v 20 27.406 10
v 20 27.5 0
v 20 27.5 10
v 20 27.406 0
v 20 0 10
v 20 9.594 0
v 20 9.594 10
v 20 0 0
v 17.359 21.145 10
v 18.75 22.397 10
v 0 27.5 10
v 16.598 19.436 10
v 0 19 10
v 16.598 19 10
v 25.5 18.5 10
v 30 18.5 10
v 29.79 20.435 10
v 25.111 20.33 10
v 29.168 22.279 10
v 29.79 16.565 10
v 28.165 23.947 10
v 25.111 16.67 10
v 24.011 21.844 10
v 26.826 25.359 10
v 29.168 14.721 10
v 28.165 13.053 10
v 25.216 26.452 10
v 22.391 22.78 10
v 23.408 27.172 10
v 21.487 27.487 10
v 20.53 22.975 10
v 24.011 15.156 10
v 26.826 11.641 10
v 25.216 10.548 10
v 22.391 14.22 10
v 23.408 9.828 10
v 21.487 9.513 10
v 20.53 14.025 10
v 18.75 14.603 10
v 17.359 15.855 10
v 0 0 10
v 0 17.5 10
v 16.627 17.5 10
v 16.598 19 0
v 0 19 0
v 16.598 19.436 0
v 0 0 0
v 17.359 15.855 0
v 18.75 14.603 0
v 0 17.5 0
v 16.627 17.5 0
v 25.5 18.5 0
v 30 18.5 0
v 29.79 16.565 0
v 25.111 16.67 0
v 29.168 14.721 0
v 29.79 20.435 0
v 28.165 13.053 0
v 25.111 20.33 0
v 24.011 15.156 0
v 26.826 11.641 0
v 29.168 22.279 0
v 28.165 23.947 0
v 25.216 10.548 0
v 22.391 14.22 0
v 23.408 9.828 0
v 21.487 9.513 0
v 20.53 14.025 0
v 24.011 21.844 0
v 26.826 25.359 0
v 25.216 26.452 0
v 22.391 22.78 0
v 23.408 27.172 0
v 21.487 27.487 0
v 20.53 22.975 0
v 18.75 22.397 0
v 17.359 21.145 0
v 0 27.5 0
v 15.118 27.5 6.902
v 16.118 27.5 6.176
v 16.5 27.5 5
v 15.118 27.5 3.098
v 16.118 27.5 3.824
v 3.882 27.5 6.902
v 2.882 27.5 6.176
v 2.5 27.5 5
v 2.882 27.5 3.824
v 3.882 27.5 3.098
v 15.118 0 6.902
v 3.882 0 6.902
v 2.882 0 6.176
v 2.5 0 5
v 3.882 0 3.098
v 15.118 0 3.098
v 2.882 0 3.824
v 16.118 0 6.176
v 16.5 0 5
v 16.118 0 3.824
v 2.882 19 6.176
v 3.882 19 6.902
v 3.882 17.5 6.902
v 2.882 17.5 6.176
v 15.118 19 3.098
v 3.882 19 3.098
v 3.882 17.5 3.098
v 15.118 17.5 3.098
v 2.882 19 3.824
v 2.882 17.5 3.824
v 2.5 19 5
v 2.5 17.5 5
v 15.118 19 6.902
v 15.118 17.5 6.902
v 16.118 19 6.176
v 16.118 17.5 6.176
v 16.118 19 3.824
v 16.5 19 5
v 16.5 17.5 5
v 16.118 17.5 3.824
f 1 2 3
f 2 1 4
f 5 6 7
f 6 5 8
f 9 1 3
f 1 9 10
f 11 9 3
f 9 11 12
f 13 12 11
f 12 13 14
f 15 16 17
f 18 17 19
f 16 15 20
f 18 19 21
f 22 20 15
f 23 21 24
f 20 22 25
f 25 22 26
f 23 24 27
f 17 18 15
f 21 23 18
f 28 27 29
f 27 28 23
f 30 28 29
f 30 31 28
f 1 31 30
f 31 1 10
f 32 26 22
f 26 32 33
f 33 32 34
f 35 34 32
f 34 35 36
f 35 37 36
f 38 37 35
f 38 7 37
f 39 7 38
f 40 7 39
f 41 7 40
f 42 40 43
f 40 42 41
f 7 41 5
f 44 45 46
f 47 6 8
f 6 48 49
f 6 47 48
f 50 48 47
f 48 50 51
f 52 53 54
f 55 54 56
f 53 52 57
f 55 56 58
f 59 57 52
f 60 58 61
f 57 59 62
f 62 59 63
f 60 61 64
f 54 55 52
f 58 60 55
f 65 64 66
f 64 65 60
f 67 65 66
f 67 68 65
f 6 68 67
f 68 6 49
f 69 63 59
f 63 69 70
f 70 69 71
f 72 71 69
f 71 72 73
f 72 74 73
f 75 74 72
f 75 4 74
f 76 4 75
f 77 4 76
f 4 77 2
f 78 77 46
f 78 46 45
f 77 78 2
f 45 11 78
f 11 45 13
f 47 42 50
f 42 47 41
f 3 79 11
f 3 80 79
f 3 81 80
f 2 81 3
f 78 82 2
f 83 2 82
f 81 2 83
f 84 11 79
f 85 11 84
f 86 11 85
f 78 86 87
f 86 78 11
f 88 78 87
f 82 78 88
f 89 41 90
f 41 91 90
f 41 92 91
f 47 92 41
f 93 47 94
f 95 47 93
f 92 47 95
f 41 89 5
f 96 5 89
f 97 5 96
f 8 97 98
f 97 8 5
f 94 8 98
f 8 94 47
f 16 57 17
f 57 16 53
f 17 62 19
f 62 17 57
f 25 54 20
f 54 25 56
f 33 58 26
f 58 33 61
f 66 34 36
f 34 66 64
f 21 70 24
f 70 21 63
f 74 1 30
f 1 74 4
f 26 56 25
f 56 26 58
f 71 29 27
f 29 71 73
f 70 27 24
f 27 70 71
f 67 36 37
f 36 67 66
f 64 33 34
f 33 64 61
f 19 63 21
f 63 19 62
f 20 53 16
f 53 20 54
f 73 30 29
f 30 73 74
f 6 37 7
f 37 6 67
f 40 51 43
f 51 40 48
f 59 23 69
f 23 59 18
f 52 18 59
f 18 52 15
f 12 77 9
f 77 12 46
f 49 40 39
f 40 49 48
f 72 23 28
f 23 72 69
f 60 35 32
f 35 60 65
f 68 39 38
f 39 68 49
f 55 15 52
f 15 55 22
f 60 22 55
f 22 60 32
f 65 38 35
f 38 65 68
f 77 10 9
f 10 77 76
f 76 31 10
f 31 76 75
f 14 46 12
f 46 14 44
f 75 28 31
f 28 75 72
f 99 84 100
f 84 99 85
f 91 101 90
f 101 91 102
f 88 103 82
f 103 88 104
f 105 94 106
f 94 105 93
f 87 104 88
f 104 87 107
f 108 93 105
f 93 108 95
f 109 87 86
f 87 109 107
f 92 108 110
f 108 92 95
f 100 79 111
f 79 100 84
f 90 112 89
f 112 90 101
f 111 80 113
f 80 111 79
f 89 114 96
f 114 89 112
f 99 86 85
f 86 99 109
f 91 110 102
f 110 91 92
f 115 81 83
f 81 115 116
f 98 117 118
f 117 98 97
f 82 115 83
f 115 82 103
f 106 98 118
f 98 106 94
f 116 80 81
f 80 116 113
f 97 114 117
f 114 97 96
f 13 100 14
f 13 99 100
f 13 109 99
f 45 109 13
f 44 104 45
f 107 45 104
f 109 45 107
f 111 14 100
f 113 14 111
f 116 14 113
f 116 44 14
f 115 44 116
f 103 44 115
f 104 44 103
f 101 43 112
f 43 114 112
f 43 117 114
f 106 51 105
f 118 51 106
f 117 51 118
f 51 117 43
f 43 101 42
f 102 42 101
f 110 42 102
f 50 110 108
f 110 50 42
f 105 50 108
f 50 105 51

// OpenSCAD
sleuf=10;

difference() {
	union() {
		cube([10+sleuf,27.5,10]);
		translate([11+sleuf,18.5,0]) cylinder(10,9,9);
	}
	translate([11+sleuf,18.5,0]) cylinder(10,4.5,4.5);
	hull(){
		translate([4.5,-0.5,5]) rotate([-90,0,0]) cylinder(30,2,2,$fn=10);
		translate([4.5+sleuf,-0.5,5]) rotate([-90,0,0]) cylinder(30,2,2,$fn=10);
	}
	translate([0,17.5,0]) cube([10+sleuf,1.5,10]);
}
